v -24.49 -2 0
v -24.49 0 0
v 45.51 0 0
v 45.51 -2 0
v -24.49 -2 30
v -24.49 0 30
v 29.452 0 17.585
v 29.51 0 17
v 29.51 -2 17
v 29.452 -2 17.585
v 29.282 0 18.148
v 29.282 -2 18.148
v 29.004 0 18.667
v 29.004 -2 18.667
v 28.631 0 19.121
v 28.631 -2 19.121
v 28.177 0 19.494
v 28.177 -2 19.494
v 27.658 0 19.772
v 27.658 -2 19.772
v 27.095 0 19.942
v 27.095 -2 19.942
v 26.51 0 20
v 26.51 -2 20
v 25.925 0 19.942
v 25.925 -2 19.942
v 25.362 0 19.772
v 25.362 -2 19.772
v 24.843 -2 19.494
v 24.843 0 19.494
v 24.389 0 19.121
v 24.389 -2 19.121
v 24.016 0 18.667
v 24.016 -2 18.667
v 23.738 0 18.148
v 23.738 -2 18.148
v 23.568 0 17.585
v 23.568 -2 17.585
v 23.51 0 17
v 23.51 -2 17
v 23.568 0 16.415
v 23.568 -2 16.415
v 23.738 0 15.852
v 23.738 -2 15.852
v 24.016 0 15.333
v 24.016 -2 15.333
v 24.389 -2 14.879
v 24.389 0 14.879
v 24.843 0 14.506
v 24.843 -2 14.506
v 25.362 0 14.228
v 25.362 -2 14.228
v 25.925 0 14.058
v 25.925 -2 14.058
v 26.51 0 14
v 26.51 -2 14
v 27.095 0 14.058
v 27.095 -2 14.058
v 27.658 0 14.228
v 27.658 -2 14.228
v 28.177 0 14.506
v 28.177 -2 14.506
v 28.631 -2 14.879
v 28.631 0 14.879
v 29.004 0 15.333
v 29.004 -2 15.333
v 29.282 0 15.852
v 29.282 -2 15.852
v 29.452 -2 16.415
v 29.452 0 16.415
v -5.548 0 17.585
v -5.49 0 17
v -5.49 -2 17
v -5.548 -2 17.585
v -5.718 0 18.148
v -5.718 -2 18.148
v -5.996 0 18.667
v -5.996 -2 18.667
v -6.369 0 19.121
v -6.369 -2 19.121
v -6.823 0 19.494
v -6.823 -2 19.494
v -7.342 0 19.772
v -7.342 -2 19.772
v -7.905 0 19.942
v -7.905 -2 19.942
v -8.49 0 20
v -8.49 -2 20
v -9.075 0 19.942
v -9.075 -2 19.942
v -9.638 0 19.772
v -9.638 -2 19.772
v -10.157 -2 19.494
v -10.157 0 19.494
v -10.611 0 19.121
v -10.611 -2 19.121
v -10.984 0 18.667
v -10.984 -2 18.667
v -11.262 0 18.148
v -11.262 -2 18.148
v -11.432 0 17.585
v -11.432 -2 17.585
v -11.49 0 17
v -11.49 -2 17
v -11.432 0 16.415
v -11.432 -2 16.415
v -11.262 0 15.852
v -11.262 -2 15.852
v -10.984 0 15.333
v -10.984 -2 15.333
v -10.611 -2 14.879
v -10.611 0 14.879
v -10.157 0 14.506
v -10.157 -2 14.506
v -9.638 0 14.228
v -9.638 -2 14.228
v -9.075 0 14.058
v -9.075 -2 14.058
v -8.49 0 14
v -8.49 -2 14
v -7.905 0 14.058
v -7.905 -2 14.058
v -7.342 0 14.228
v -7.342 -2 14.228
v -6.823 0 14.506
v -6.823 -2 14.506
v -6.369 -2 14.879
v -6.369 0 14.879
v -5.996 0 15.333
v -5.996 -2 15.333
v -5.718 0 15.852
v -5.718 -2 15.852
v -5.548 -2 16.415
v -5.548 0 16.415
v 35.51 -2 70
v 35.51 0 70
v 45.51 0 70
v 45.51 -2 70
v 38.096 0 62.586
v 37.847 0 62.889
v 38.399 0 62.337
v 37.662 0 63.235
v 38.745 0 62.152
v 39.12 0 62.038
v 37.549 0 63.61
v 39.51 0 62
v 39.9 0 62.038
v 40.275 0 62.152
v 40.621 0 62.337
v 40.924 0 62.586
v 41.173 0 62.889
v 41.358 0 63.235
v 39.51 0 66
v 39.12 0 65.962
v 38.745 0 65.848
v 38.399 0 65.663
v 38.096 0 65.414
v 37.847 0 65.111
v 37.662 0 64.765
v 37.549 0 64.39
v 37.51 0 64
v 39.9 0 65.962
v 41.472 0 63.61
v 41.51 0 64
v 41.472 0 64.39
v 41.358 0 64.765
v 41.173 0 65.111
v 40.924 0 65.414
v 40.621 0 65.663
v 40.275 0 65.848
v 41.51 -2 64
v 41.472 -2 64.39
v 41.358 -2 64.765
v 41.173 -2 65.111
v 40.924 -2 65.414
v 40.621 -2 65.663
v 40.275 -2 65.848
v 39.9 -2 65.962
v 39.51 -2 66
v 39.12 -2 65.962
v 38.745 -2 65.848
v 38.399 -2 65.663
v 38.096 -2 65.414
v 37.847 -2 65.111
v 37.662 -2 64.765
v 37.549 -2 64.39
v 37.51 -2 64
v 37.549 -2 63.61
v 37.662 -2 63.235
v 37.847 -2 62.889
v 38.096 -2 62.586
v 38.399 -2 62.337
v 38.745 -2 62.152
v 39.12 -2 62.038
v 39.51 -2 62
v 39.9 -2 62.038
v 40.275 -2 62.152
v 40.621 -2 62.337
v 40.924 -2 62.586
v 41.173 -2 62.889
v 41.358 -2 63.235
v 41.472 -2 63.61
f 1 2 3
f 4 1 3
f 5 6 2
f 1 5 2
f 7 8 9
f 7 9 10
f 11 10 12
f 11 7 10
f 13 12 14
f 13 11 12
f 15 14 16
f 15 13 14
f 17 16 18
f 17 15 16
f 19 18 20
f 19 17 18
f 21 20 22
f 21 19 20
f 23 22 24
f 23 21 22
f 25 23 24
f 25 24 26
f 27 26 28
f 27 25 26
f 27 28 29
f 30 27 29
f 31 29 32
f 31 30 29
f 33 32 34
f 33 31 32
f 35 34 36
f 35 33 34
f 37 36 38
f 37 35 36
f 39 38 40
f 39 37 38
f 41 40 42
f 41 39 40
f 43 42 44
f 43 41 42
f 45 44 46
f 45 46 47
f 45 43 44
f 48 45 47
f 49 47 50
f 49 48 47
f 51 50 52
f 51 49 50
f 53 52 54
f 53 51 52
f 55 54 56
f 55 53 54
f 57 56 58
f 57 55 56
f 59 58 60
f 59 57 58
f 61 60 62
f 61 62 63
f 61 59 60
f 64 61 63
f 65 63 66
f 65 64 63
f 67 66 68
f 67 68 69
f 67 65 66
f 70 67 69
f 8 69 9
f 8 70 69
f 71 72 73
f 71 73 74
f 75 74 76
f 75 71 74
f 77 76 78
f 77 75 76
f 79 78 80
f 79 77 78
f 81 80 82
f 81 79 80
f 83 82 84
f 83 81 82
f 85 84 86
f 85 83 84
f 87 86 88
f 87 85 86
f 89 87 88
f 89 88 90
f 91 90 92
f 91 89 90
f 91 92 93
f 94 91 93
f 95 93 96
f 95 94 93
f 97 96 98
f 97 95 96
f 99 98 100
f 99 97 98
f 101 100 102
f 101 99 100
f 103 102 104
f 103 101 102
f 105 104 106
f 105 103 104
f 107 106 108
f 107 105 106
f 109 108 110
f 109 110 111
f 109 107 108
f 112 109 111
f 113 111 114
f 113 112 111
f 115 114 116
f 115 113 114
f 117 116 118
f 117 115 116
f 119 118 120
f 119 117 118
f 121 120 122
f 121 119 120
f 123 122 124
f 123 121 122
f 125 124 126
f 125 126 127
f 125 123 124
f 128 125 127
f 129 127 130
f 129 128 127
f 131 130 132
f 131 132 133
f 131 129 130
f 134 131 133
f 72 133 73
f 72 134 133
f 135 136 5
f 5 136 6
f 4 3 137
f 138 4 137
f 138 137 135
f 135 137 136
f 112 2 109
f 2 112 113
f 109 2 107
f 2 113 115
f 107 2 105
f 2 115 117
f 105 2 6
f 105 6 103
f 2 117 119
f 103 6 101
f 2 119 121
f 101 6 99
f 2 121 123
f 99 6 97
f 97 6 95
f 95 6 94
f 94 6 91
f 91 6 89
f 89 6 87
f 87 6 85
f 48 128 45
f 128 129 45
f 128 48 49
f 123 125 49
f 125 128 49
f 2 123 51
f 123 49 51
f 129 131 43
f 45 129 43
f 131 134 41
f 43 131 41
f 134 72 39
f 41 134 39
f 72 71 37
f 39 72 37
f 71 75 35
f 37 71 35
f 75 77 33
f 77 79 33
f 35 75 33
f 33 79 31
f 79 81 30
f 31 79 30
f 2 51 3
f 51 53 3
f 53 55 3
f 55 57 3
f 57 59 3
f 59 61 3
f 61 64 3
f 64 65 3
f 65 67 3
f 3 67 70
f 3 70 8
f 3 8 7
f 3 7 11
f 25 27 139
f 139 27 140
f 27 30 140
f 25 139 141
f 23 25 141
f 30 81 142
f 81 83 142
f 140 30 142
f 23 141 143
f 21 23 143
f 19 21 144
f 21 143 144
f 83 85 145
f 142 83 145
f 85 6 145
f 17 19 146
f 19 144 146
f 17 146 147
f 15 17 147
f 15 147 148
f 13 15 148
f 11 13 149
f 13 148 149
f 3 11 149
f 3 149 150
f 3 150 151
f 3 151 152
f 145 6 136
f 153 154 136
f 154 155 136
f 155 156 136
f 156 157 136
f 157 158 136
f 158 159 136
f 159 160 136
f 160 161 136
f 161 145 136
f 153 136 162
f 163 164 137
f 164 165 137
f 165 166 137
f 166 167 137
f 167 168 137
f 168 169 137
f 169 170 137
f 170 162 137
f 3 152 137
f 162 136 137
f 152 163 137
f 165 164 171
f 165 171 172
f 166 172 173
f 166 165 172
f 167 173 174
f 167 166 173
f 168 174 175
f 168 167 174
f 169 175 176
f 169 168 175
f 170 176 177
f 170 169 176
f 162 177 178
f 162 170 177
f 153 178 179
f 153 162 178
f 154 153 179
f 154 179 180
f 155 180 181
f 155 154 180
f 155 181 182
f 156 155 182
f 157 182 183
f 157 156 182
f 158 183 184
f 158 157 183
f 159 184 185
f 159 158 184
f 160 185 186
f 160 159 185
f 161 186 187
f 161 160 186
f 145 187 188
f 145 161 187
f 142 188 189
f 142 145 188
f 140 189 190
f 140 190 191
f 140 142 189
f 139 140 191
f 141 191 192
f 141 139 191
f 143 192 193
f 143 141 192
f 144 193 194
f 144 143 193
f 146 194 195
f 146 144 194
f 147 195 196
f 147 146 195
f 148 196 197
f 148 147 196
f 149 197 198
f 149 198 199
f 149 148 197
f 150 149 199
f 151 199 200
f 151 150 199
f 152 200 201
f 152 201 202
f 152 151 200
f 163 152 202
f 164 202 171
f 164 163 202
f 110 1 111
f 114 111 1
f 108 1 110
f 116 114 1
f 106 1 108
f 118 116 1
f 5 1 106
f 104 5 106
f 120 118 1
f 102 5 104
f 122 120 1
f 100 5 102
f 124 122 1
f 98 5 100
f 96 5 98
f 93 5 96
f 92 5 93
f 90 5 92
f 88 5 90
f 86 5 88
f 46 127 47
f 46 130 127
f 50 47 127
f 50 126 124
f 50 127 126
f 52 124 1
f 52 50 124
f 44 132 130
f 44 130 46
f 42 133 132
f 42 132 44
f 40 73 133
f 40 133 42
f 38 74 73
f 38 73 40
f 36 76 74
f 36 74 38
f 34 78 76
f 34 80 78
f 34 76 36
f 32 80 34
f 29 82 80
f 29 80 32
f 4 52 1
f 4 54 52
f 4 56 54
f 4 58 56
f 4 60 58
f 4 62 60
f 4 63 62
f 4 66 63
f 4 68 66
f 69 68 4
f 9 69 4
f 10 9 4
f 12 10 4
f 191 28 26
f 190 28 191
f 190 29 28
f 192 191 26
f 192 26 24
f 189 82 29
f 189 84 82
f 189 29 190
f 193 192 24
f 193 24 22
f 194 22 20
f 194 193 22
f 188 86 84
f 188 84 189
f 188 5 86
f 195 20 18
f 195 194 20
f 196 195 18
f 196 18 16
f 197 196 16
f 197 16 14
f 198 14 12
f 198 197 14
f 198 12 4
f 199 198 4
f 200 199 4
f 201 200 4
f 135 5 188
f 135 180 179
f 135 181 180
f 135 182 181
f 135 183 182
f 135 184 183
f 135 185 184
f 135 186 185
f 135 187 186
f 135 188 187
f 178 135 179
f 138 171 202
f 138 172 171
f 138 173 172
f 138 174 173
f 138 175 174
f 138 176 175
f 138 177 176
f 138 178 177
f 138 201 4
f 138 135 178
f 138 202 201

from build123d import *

# Parameters (mm, degrees)
F0_R     = 3
F0_R_2   = 2
F1_DEPTH = 2


with BuildPart() as f1:
    # F0 (on Front) → F1 (new body)
    with BuildSketch(Plane.XZ):
        Polygon((-24.489924, 30), (-24.489924, 0), (45.510076, 0), (45.510076, 70), (35.510076, 70), align=None)
        with Locations((-8.489924, 17)):
            Circle(F0_R, mode=Mode.SUBTRACT)
        with Locations((26.510076, 17)):
            Circle(F0_R, mode=Mode.SUBTRACT)
        with Locations((39.510076, 64)):
            Circle(F0_R_2, mode=Mode.SUBTRACT)
    extrude(amount=F1_DEPTH)


solid = f1.part
